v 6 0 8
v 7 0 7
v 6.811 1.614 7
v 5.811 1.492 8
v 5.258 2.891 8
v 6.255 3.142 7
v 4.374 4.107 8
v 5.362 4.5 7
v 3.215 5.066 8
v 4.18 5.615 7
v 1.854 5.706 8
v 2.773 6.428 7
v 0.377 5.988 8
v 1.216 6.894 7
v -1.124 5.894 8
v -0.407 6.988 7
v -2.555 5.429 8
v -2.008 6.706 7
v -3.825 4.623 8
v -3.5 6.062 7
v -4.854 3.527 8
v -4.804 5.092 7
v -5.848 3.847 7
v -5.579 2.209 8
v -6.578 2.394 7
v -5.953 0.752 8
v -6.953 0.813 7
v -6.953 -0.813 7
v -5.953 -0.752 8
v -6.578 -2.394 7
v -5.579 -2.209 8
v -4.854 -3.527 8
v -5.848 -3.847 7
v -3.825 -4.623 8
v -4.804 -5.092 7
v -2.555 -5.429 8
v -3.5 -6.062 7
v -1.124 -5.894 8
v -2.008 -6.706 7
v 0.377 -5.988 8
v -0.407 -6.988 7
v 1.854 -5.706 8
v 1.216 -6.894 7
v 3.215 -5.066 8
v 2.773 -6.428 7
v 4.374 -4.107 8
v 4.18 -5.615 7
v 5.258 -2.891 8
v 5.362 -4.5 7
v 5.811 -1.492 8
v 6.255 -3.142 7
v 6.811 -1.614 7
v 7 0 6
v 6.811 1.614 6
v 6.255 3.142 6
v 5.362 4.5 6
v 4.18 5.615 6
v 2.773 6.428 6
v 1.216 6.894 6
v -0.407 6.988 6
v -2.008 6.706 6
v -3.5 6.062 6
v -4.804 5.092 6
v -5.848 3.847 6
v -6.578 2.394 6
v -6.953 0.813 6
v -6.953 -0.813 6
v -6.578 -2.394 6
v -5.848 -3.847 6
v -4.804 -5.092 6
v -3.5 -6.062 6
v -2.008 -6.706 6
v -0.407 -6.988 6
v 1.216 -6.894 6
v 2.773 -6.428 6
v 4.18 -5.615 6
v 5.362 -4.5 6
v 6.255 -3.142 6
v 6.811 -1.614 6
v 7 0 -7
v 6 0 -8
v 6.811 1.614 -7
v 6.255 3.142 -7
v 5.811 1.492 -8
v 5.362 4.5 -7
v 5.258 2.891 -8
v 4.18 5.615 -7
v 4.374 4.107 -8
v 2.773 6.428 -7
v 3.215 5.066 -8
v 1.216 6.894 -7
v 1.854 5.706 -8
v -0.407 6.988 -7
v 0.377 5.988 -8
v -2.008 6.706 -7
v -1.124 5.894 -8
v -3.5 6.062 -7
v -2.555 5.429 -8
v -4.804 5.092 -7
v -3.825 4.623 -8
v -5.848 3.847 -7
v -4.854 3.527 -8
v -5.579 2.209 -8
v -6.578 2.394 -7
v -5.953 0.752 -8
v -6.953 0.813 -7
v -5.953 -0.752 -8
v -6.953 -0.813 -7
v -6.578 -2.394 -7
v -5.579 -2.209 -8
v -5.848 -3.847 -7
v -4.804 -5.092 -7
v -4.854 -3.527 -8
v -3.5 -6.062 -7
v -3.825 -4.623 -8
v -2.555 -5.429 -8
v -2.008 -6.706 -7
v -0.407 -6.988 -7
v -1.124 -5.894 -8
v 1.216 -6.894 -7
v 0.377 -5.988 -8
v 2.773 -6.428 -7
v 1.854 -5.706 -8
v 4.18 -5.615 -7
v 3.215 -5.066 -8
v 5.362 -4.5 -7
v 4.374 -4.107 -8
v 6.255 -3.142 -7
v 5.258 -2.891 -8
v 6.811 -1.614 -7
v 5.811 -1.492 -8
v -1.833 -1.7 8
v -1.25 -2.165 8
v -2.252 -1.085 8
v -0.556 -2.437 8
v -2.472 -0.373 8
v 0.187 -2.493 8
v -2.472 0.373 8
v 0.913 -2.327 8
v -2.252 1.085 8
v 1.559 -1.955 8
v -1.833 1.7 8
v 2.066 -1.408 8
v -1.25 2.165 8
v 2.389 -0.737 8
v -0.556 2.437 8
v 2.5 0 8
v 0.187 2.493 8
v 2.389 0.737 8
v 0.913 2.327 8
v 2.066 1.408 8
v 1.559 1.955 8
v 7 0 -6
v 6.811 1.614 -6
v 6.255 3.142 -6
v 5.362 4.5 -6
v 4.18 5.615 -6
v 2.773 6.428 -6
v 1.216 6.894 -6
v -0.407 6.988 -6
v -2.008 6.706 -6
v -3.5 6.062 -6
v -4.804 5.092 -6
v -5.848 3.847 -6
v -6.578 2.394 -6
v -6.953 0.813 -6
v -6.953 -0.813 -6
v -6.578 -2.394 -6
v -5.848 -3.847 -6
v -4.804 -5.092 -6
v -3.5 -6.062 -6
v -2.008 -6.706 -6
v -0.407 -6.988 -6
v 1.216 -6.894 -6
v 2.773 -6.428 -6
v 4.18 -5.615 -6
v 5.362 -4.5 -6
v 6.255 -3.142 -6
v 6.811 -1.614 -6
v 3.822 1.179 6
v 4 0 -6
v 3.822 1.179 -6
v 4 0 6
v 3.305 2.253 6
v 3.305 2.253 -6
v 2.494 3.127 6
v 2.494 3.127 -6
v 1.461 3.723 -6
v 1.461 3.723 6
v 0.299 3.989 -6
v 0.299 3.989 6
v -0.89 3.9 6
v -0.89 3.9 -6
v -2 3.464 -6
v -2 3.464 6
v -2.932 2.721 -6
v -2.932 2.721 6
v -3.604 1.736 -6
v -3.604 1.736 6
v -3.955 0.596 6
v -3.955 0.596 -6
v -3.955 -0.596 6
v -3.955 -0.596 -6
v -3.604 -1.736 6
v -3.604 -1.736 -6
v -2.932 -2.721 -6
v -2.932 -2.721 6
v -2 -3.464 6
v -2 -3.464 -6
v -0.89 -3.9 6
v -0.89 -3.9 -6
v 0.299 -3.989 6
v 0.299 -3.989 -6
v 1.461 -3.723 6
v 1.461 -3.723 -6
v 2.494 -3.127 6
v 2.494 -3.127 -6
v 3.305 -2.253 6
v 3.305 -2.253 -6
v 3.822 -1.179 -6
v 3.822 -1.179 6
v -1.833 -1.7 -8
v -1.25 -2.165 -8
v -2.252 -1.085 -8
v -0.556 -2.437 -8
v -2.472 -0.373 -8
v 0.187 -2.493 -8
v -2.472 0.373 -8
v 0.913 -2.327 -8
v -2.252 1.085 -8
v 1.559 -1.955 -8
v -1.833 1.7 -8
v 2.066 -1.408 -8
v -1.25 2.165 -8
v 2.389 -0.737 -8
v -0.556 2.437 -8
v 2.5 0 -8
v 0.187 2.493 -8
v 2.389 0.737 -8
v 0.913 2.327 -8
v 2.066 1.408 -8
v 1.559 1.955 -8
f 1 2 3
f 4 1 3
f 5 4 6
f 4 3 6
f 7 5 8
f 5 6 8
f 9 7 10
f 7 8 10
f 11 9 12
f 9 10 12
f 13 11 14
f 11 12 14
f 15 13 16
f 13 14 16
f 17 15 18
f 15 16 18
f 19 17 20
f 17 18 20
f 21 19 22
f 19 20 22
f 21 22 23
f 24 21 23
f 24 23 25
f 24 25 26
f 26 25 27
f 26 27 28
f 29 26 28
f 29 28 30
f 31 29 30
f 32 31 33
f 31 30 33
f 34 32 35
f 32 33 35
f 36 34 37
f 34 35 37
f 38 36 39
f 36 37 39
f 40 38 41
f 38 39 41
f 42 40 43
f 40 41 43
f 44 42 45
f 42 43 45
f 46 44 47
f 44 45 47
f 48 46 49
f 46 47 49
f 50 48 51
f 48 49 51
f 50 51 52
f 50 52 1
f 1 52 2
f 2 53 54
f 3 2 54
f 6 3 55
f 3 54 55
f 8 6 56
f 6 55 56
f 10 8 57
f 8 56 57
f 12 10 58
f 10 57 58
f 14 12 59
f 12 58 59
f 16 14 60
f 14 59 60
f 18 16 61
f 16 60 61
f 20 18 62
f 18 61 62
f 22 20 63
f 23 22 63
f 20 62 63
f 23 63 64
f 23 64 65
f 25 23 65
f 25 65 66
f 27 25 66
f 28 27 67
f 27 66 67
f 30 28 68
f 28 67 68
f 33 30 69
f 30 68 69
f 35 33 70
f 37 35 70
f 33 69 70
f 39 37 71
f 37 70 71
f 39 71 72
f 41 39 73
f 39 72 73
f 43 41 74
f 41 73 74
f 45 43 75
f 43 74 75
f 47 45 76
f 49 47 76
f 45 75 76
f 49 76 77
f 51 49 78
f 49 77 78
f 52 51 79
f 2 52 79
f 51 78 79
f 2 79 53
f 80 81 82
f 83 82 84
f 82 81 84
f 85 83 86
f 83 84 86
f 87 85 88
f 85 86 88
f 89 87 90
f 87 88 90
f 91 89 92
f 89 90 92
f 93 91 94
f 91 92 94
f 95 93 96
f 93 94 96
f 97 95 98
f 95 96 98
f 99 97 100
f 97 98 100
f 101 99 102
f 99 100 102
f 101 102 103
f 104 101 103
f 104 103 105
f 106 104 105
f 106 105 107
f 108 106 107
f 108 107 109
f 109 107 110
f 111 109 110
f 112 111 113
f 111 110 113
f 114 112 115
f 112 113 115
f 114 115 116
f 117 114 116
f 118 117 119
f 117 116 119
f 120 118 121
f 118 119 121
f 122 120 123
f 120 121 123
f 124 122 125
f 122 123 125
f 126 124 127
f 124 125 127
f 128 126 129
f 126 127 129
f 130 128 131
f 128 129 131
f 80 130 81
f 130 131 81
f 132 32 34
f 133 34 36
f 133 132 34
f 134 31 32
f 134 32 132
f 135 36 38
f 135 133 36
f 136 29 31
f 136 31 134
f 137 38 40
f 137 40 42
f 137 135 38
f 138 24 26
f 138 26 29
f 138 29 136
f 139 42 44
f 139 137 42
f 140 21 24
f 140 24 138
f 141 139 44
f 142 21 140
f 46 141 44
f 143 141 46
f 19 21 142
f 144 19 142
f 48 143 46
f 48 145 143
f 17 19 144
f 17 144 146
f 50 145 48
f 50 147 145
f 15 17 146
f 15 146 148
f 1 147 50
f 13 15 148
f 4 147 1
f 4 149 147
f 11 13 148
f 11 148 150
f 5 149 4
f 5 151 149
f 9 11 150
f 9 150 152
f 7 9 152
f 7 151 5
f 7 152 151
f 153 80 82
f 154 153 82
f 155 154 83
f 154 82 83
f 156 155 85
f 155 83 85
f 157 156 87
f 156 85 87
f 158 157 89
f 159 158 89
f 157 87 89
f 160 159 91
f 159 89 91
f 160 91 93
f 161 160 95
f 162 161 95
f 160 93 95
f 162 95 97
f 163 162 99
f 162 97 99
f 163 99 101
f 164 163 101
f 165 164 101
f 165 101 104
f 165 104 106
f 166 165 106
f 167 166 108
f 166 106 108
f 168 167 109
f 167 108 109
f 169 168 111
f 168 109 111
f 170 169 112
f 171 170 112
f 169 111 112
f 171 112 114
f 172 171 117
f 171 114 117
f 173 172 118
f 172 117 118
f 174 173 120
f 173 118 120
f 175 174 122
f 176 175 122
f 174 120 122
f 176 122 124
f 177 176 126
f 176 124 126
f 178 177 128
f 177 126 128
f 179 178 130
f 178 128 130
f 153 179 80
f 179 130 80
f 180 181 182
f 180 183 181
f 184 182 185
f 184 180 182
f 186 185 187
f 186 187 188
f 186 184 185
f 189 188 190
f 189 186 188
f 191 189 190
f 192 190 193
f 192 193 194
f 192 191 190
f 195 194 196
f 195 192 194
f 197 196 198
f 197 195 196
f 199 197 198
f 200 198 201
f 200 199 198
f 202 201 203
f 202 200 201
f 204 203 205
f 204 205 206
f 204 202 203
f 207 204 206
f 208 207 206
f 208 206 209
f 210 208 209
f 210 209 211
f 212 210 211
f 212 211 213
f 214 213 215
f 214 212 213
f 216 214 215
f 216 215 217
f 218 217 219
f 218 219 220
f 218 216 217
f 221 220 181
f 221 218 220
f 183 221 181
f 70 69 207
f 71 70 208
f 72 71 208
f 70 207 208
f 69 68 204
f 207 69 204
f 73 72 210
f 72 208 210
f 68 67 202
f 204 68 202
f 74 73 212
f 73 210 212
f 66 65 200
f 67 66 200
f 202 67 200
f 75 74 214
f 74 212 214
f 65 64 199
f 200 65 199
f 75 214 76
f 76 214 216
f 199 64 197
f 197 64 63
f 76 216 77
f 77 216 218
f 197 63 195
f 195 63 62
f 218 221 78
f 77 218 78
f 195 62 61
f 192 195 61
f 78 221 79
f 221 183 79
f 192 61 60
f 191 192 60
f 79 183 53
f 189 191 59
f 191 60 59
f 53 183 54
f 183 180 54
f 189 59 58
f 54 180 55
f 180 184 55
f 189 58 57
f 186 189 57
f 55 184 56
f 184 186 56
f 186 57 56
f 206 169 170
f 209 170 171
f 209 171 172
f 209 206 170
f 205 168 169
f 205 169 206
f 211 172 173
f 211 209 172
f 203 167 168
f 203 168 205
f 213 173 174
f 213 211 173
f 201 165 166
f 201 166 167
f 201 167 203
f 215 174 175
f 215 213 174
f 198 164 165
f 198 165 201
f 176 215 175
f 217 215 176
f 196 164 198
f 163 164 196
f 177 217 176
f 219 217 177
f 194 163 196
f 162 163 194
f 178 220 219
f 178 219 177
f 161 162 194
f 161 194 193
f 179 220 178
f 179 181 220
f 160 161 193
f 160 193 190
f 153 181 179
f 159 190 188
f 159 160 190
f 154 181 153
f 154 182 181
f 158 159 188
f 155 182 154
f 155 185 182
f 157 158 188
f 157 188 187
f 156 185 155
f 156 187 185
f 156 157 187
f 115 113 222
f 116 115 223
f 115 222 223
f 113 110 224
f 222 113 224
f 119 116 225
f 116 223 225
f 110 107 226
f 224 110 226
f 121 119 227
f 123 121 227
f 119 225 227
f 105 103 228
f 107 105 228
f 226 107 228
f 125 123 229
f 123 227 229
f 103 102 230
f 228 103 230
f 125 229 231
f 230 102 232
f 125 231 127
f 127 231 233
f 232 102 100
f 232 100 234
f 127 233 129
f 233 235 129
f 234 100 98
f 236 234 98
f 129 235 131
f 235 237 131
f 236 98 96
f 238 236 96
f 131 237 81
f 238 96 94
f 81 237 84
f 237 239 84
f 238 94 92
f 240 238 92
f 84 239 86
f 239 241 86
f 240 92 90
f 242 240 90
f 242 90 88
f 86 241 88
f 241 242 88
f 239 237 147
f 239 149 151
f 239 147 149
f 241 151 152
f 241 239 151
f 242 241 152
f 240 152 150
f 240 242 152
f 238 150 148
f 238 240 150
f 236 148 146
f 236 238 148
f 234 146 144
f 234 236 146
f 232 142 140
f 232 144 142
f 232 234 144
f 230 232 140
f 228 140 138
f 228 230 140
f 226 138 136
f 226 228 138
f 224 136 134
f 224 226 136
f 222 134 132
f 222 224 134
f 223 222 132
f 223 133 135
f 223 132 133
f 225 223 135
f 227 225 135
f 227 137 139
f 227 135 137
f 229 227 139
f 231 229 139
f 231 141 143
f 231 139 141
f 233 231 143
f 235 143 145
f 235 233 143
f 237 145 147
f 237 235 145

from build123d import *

# Parameters (mm, degrees)
SKETCH1_R               = 4
BOSS_EXTRUDE1_DEPTH     = 6
SKETCH2_R               = 7
BOSS_EXTRUDE2_DEPTH     = 2
LPATTERN1_COUNT         = 2
LPATTERN1_PITCH         = 14
CUT_EXTRUDE1_DEPTH      = 13.727922061
CUT_EXTRUDE1_DEPTH_BACK = 13.727922061
SKETCH3_R               = 2.5
CHAMFER1_SIZE           = 1


with BuildPart() as part:
    # Sketch1 → Boss-Extrude1 (new, symmetric)
    with BuildSketch(Plane.XY):
        Circle(SKETCH1_R)
    extrude(amount=BOSS_EXTRUDE1_DEPTH, both=True)

    # Sketch2 → Boss-Extrude2 (add)
    with BuildSketch(Plane.XY.offset(6)):
        Circle(SKETCH2_R)
    boss_extrude2 = extrude(amount=BOSS_EXTRUDE2_DEPTH)

    # LPattern1: Boss-Extrude2 ×2
    with Locations(*[(0, 0, -i * LPATTERN1_PITCH) for i in range(1, LPATTERN1_COUNT)]):
        add(boss_extrude2)

    # Sketch3 → Cut-Extrude1 (cut, two sides: drawn at the far end of the back side and taken through both)
    with BuildSketch(Plane.XY.offset(-CUT_EXTRUDE1_DEPTH_BACK)):
        Circle(SKETCH3_R)
    extrude(amount=CUT_EXTRUDE1_DEPTH + CUT_EXTRUDE1_DEPTH_BACK, mode=Mode.SUBTRACT)

    # Chamfer1
    chamfer1_edges = [part.edges().sort_by_distance(p)[0] for p in [
        (-7, 0, 8),
        (-7, 0, -8),
    ]]
    chamfer(chamfer1_edges, length=CHAMFER1_SIZE)


solid = part.part
